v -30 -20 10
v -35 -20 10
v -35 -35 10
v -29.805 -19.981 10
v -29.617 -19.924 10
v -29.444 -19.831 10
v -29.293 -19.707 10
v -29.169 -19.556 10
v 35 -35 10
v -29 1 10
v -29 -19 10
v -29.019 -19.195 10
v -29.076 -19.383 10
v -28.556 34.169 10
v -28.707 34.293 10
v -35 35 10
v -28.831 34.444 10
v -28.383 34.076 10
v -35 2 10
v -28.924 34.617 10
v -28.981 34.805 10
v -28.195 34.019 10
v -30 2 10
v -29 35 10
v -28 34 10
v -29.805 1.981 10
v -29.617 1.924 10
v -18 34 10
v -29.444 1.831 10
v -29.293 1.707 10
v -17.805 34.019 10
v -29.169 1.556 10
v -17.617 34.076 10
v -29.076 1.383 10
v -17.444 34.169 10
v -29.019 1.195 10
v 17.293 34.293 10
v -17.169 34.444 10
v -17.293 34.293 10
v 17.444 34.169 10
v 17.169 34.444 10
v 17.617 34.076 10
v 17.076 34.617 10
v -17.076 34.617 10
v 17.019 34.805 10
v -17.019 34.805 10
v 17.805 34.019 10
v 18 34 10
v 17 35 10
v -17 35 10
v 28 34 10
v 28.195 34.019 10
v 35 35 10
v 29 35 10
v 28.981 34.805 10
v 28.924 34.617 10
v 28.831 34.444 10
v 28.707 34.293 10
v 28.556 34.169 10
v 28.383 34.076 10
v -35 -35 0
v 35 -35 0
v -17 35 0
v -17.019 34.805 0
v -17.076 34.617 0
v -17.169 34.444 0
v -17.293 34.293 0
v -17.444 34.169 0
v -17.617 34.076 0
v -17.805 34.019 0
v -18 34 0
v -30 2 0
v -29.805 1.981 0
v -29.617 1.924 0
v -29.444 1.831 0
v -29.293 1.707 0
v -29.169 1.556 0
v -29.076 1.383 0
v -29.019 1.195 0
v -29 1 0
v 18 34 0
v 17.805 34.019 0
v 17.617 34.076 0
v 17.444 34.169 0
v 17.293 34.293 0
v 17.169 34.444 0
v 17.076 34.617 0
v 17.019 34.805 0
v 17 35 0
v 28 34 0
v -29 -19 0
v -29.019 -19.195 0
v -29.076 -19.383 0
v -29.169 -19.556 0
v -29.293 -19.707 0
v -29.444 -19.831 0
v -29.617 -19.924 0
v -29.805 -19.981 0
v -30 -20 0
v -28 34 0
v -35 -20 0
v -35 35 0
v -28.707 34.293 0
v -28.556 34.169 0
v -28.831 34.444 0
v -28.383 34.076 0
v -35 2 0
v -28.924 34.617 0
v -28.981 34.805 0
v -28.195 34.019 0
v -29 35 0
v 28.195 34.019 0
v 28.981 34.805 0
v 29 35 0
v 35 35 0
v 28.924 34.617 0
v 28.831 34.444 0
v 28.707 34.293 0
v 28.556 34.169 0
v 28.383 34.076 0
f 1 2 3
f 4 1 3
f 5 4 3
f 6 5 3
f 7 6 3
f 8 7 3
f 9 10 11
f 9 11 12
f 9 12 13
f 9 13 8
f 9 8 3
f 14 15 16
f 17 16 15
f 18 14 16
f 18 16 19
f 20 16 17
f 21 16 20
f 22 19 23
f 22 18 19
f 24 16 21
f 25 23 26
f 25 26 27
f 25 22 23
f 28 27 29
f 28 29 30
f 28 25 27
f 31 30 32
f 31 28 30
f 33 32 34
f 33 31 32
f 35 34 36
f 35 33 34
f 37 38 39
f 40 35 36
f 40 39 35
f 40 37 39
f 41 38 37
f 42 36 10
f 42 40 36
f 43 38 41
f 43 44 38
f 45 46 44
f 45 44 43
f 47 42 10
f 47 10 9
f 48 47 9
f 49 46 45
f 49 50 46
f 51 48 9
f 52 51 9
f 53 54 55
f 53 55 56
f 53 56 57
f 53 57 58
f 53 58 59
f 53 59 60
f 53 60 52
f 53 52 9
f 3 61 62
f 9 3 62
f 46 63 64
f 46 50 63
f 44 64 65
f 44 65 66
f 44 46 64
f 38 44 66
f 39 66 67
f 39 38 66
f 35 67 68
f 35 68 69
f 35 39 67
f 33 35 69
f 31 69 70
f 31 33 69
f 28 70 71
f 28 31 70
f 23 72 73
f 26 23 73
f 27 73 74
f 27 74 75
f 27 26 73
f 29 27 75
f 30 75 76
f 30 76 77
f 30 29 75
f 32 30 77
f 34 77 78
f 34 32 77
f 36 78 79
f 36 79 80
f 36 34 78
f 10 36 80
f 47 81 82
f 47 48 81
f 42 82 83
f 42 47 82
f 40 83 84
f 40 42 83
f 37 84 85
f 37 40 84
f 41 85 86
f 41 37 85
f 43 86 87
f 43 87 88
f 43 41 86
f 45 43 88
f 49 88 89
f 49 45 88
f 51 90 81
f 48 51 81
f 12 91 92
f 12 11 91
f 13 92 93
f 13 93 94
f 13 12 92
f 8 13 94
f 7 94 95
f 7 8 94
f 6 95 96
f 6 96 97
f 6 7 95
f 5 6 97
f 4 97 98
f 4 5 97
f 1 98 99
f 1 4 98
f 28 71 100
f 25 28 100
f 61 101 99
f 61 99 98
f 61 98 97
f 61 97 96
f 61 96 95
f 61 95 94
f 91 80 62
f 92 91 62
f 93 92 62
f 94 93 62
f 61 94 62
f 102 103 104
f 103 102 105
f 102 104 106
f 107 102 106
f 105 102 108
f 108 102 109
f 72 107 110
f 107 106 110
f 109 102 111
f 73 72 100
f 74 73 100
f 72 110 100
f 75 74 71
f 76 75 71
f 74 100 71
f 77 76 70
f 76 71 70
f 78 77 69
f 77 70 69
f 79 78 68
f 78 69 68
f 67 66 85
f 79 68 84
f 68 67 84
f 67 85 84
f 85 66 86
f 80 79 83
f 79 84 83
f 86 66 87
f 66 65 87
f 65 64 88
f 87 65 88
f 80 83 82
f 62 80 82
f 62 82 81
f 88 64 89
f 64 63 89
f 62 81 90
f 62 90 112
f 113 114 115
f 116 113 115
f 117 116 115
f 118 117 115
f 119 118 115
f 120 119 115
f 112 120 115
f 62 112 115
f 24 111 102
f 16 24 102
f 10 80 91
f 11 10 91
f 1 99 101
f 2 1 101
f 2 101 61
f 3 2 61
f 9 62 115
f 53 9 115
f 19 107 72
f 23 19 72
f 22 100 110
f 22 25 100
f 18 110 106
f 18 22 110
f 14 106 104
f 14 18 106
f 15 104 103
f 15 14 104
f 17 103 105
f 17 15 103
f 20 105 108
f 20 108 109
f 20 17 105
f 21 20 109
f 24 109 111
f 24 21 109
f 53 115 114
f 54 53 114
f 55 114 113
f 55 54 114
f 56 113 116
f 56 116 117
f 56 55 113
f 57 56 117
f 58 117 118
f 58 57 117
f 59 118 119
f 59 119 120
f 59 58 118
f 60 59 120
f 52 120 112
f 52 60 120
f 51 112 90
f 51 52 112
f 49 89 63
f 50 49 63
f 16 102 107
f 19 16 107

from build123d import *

# Parameters (mm, degrees)
EXTRUDE_1_DEPTH = 10
FILLET_1_R      = 1


with BuildPart() as part:
    # 草图4 → 凸台-拉伸1 (new body)
    with BuildSketch(Plane.XY):
        Polygon((-29, 35), (-35, 35), (-35, 2), (-29, 2), (-29, -20), (-35, -20), (-35, -35), (35, -35), (35, 35), (29, 35), (29, 34), (17, 34), (17, 35), (-17, 35), (-17, 34), (-29, 34), align=None)
    extrude(amount=EXTRUDE_1_DEPTH)

    # 圆角1
    fillet_1_edges = [part.edges().sort_by_distance(p)[0] for p in [
        (-29, -20, 5),
        (-29, 2, 5),
        (29, 34, 5),
        (17, 34, 5),
        (-17, 34, 5),
        (-29, 34, 5),
    ]]
    fillet(fillet_1_edges, radius=FILLET_1_R - 0.0001)  # a hair under: the kernel refuses the full size


solid = part.part
